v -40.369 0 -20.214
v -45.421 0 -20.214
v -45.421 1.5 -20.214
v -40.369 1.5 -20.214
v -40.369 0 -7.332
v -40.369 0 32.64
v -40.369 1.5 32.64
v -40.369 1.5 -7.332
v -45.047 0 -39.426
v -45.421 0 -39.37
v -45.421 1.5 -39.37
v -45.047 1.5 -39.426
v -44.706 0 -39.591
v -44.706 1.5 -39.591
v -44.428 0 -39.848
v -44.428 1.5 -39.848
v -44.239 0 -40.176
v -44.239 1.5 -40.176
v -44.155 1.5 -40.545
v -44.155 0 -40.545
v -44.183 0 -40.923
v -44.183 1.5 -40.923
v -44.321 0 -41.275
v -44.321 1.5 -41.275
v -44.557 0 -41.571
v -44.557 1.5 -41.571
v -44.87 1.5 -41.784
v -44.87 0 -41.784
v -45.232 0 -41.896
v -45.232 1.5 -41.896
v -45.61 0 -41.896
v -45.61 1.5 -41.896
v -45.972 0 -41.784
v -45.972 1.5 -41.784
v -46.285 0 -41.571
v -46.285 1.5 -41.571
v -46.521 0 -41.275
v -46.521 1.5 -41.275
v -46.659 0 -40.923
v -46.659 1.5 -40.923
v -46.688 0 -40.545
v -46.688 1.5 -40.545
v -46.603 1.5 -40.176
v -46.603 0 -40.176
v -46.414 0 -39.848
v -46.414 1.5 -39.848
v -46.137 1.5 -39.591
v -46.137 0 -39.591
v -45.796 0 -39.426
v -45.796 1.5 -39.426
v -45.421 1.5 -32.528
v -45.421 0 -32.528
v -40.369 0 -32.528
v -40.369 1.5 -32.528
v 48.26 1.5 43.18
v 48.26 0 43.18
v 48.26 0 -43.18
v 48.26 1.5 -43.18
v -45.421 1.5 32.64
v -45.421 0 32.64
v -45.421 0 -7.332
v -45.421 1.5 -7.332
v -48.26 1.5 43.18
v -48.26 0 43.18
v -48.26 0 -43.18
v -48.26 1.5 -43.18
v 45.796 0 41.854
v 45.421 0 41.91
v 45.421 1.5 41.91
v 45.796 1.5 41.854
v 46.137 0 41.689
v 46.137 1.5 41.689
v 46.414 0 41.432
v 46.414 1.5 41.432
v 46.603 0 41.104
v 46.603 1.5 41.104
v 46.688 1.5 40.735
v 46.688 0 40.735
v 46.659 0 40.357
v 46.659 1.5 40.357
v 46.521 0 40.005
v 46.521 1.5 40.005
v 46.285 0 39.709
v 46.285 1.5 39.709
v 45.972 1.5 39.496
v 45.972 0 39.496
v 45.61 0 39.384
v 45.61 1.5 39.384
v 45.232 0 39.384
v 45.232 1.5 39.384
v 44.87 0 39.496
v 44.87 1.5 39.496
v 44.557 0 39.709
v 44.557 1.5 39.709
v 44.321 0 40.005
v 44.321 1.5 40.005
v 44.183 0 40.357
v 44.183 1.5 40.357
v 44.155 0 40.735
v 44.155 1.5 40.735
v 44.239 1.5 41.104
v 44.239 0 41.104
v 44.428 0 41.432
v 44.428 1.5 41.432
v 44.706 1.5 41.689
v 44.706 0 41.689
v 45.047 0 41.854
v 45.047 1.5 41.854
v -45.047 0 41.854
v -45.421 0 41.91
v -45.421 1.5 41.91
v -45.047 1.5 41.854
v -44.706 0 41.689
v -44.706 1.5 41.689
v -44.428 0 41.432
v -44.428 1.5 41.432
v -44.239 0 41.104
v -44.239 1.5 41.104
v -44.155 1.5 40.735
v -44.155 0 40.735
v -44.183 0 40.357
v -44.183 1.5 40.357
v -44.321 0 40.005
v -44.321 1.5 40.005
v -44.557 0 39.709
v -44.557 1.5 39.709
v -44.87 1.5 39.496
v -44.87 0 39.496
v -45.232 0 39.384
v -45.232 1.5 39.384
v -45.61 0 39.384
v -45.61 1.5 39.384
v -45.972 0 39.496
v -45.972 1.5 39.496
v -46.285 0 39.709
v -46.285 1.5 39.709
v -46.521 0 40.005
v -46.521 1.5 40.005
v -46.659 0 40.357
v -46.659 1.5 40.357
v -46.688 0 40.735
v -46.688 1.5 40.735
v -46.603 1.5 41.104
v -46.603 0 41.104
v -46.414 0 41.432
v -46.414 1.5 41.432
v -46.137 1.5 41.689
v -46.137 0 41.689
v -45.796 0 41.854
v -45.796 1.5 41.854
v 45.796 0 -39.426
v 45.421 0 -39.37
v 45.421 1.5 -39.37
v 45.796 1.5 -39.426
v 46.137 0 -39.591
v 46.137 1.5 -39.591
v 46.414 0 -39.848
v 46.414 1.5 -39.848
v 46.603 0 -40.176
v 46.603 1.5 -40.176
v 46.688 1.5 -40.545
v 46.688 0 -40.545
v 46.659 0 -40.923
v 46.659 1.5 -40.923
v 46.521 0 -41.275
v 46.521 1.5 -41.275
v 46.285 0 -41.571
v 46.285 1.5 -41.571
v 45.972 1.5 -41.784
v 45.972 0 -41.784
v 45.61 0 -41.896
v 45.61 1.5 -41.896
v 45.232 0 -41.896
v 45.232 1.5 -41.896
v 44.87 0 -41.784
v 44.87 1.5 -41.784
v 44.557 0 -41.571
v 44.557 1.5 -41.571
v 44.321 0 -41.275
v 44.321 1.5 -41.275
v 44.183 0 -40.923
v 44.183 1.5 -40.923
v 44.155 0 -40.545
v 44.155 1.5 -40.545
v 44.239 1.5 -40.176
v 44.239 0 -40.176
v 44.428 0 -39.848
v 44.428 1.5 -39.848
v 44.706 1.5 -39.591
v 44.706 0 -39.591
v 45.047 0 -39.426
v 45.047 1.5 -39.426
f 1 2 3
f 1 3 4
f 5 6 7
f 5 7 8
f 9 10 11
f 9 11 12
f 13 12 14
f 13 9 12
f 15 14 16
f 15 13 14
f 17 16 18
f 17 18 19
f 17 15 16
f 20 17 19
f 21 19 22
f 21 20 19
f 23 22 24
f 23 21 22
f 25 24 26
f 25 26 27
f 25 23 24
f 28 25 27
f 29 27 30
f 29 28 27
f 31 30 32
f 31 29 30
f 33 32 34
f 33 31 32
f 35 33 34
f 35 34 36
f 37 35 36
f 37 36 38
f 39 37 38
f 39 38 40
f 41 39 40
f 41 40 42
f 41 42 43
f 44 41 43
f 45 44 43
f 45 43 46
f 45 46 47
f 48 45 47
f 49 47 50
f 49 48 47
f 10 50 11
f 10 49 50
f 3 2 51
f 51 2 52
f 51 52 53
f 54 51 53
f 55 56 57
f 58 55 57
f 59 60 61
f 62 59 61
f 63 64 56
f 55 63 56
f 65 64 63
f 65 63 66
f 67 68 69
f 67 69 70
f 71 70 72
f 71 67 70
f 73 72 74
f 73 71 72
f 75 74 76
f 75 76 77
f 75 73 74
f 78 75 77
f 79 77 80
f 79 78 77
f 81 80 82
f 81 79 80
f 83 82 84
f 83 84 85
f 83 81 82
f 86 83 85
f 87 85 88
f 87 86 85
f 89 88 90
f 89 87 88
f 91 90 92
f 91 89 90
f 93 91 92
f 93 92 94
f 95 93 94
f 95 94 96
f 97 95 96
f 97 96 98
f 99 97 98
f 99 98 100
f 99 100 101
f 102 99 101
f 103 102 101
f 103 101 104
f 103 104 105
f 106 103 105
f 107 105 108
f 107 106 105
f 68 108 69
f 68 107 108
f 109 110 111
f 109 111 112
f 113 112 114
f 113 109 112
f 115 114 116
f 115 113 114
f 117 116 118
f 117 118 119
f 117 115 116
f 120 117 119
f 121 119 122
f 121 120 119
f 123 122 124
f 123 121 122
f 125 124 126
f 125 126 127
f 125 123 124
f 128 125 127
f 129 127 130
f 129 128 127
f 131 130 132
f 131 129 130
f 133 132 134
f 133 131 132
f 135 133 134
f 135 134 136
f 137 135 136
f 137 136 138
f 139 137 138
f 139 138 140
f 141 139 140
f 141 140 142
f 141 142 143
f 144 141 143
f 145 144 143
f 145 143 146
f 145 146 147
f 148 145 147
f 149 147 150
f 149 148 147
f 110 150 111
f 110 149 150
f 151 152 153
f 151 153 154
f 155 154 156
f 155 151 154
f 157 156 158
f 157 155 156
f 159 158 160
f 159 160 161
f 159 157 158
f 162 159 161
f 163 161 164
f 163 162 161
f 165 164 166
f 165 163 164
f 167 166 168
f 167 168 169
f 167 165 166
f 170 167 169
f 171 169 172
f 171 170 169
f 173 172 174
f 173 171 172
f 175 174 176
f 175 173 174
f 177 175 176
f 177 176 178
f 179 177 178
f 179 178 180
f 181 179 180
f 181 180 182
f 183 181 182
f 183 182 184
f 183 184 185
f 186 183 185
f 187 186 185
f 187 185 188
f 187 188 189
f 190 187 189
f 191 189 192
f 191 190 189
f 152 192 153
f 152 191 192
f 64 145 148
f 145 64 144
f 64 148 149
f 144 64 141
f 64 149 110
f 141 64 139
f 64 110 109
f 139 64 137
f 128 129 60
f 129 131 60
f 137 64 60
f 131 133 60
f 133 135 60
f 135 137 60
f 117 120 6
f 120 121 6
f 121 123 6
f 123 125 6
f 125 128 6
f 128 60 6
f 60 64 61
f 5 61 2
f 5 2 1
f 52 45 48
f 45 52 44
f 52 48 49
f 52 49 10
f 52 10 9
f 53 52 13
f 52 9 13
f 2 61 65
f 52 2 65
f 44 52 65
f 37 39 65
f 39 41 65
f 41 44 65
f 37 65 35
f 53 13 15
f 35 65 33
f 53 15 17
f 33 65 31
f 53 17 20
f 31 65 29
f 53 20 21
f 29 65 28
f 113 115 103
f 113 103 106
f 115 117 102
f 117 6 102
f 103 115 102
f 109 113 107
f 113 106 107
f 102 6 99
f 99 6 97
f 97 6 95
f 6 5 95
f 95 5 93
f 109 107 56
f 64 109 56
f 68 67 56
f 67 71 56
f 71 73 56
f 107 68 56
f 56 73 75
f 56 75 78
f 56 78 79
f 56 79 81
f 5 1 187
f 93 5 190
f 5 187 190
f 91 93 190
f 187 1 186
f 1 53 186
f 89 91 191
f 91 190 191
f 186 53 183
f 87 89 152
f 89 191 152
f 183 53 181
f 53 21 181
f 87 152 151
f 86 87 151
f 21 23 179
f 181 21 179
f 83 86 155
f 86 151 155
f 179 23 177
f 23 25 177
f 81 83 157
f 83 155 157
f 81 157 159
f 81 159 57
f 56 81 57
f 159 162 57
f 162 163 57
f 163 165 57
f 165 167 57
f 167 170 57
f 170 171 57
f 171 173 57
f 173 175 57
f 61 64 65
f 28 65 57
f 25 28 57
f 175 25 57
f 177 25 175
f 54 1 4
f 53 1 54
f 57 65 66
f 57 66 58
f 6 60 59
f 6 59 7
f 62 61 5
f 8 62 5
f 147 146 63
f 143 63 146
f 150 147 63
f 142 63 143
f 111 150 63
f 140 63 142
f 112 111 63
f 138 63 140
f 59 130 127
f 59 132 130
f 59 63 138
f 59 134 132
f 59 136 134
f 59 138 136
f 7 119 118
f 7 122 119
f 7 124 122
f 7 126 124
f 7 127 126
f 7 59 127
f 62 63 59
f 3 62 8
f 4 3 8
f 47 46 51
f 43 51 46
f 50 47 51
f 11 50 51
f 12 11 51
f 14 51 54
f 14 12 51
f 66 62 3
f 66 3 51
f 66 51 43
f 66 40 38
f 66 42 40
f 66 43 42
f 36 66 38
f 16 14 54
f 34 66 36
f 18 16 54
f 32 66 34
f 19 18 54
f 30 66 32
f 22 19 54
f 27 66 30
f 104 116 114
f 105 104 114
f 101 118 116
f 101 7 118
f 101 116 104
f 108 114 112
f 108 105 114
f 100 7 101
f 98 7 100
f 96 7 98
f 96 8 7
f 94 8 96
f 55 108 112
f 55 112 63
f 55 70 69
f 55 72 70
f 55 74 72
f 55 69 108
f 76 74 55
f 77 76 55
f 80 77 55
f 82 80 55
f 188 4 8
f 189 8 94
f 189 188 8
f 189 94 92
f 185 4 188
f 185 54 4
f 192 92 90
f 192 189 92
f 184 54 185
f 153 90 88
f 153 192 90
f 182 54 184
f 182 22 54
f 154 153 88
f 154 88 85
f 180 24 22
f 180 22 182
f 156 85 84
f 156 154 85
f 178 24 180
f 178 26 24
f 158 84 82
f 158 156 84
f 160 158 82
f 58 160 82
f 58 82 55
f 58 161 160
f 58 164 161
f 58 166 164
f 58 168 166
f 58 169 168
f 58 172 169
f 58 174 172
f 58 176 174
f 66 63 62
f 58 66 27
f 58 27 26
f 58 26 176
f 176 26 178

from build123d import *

# Parameters (mm, degrees)
SKETCH1_W           = 96.52
SKETCH1_H           = 86.36
SKETCH1_R           = 1.27
SKETCH1_W_2         = 5.052423249
SKETCH1_H_2         = 12.313816371
SKETCH1_H_3         = 39.972542374
BOSS_EXTRUDE1_DEPTH = 1.5


with BuildPart() as part:
    # Sketch1 → Boss-Extrude1 (new body)
    with BuildSketch(Plane(origin=(0, 0, 0), x_dir=(1, 0, 0), z_dir=(0, 1, 0))):
        Rectangle(SKETCH1_W, SKETCH1_H)
        with Locations(Location((-45.421176471, 40.64, 0), (0, 0, 270))):
            Circle(SKETCH1_R, mode=Mode.SUBTRACT)
        with Locations(Location((45.421176471, 40.64, 0), (0, 0, 270))):
            Circle(SKETCH1_R, mode=Mode.SUBTRACT)
        with Locations(Location((-45.421176471, -40.64, 0), (0, 0, 270))):
            Circle(SKETCH1_R, mode=Mode.SUBTRACT)
        with Locations(Location((45.421176471, -40.64, 0), (0, 0, 270))):
            Circle(SKETCH1_R, mode=Mode.SUBTRACT)
        with Locations((-42.894964847, 26.371121385)):
            Rectangle(SKETCH1_W_2, SKETCH1_H_2, mode=Mode.SUBTRACT)
        with Locations((-42.894964847, -12.654204345)):
            Rectangle(SKETCH1_W_2, SKETCH1_H_3, mode=Mode.SUBTRACT)
    extrude(amount=BOSS_EXTRUDE1_DEPTH)


solid = part.part
